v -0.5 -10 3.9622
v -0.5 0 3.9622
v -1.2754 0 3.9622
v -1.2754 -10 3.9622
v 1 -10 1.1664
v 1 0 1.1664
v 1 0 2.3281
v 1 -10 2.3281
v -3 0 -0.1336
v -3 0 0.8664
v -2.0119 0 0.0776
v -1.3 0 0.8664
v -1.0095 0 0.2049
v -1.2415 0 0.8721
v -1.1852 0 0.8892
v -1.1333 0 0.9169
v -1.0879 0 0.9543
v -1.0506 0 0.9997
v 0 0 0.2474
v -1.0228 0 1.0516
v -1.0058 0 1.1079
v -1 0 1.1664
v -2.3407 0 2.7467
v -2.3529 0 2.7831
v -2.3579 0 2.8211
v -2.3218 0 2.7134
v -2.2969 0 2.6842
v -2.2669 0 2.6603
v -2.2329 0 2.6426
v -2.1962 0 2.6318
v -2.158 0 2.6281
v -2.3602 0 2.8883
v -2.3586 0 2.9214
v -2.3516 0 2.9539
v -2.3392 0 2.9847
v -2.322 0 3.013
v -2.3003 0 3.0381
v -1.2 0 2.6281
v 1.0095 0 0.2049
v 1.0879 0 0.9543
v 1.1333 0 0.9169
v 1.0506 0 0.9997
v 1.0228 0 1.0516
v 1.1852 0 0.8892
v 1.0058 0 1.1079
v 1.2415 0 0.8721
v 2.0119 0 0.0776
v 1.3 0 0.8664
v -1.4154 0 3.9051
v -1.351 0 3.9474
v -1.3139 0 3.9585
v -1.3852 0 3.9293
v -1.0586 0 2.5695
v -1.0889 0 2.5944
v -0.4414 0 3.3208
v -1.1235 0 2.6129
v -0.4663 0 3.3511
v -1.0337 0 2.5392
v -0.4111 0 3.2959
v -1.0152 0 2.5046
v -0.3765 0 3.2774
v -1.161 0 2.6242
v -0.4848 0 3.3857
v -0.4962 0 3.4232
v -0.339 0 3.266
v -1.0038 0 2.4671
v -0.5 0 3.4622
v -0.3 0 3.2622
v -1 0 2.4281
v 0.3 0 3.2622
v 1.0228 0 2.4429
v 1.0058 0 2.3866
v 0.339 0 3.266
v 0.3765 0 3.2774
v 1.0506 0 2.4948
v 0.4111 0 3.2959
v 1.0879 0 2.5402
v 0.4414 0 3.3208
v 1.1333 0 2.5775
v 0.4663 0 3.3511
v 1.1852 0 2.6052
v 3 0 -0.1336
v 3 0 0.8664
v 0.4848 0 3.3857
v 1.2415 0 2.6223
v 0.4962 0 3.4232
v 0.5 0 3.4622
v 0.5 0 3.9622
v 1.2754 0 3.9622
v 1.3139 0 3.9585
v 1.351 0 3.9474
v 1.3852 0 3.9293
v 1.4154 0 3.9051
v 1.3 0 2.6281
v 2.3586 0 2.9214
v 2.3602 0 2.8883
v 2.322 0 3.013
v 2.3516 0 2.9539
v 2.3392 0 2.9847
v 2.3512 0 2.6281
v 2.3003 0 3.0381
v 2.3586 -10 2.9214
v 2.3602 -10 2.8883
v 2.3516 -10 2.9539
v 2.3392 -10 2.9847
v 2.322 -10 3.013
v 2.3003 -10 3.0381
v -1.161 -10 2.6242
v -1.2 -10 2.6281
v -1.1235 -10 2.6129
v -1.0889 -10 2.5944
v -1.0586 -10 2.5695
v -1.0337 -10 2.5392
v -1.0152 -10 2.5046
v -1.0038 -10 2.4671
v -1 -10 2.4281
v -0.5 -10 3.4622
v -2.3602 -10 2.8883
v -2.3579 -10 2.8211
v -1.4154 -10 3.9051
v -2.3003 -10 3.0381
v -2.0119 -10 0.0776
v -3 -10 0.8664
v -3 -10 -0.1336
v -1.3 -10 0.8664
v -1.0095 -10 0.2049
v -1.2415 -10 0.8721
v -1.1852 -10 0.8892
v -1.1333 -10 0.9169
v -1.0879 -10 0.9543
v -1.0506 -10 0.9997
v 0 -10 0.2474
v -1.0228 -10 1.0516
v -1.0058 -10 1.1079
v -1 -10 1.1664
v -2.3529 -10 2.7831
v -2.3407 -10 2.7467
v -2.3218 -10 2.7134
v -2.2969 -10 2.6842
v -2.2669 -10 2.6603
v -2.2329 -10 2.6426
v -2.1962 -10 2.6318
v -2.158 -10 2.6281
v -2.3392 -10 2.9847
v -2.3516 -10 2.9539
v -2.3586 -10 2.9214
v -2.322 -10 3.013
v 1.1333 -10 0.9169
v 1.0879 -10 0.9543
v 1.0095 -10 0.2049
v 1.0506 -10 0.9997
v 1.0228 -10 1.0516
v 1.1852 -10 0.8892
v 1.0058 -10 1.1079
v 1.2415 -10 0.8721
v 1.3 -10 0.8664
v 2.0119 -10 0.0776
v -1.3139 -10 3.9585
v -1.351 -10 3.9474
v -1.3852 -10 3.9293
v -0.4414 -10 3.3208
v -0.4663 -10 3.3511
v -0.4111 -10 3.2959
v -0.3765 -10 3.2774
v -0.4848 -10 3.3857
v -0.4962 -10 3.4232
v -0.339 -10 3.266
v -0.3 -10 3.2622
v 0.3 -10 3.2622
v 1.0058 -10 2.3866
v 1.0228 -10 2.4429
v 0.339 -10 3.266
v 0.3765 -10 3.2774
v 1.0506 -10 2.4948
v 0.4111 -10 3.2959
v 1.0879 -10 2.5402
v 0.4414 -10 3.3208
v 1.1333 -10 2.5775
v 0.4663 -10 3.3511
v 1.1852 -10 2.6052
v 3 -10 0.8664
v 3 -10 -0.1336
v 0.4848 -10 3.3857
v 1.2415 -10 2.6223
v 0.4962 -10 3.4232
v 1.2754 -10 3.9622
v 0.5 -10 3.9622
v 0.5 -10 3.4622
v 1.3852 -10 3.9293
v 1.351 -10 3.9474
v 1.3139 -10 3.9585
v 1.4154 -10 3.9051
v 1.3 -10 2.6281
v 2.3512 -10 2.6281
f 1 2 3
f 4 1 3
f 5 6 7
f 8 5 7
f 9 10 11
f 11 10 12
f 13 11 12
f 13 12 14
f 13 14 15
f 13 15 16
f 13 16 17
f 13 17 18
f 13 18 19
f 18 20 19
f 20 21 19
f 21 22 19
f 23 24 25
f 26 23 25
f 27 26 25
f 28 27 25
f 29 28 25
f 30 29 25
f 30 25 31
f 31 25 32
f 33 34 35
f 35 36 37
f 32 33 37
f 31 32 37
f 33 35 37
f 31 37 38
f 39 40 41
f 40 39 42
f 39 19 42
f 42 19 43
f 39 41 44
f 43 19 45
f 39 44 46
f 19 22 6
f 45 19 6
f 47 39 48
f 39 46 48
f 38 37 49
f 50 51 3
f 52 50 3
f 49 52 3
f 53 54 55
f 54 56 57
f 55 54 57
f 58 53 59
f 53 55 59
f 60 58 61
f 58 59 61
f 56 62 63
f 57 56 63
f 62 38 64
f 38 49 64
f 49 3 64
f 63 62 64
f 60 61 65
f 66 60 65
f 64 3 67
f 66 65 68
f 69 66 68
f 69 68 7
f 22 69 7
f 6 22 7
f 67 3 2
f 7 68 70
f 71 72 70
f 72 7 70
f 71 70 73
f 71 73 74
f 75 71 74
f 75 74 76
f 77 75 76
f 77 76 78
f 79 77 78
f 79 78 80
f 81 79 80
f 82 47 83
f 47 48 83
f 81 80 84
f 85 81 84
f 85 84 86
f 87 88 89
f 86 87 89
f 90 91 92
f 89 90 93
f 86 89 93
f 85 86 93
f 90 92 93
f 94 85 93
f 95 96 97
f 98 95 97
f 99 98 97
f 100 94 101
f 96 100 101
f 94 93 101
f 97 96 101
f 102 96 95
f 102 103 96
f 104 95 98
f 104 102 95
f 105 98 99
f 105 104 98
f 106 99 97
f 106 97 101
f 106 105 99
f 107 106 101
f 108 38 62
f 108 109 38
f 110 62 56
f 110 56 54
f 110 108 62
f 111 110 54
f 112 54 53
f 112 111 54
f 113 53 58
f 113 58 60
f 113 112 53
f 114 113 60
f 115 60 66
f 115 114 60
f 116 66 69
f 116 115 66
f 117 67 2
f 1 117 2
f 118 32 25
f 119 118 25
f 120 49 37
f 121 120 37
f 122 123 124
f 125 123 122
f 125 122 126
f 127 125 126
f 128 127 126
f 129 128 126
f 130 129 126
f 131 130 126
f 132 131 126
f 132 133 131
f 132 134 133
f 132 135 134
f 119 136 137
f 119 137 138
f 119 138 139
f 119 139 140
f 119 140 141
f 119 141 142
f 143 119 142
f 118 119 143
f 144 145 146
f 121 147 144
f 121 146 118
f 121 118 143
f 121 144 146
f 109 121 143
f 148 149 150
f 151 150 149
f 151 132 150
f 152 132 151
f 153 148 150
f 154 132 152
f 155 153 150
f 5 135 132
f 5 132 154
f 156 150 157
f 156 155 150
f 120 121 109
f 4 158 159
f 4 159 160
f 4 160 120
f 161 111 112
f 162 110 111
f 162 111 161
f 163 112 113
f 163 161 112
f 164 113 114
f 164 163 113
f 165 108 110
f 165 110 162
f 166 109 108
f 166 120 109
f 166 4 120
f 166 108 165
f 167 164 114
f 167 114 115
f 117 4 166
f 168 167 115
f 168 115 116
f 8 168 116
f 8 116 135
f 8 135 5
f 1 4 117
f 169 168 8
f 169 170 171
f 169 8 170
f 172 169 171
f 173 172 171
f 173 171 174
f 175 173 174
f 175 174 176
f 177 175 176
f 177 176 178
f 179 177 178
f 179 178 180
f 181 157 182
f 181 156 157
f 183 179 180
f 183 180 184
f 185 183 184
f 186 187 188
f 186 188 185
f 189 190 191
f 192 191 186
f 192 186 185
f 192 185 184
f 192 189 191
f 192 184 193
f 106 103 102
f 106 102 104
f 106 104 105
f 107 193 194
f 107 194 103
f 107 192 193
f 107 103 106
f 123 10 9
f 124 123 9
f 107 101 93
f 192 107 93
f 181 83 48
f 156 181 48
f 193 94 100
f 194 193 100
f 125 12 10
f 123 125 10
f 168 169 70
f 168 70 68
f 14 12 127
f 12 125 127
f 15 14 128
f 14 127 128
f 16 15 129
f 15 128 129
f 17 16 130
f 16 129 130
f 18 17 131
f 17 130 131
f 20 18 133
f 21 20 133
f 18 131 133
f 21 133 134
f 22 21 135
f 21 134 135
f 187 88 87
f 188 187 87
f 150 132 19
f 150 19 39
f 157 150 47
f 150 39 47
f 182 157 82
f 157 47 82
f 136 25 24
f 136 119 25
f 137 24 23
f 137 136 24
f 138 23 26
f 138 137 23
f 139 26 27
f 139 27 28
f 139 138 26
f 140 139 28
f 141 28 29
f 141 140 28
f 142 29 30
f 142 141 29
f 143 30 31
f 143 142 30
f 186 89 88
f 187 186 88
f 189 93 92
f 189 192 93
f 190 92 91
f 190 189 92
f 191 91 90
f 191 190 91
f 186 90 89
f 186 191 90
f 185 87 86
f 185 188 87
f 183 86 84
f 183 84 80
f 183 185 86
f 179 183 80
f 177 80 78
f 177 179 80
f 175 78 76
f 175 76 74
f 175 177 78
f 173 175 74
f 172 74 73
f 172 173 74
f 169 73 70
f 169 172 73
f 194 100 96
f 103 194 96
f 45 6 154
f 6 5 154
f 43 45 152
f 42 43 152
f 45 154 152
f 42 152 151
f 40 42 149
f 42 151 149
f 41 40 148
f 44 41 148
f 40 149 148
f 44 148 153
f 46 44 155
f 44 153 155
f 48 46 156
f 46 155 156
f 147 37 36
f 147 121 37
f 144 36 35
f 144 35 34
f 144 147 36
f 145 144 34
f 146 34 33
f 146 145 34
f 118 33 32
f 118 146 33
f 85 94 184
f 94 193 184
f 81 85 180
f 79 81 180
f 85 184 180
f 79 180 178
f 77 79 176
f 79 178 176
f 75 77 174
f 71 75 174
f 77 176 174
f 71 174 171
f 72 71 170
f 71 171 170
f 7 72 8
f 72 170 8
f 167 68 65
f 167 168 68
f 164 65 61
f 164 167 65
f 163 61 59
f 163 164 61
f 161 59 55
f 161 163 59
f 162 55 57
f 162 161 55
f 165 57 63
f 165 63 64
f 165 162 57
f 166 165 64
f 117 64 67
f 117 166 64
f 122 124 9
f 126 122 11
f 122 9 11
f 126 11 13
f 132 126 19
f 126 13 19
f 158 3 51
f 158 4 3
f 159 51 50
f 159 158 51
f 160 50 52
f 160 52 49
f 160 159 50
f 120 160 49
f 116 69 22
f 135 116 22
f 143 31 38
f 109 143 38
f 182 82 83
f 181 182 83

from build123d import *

# Parameters (mm, degrees)
F1_DEPTH = 10
F2_R     = 0.2
F3_R     = 0.3


# Not quite as in the source:
# - a feature names something its author has since deleted; it is built from what else it names


with BuildPart() as f1:
    # F0 (on Front) → F1 (new body)
    with BuildSketch(Plane.XZ):
        with BuildLine():
            Line((-3, 0.8663841993), (-3, -0.1336158007))
            ThreePointArc((-3, -0.1336158007), (-1.5120515098, 0.1517905158), (0, 0.2474341606))
            ThreePointArc((0, 0.2474341606), (1.5120515098, 0.1517905158), (3, -0.1336158007))
            Line((3, -0.1336158007), (3, 0.8663841993))
            Line((3, 0.8663841993), (1, 0.8663841993))
            Line((1, 0.8663841993), (1, 2.6280805469))
            Line((1, 2.6280805469), (2.3511576001, 2.6280805469))
            Line((2.3511576001, 2.6280805469), (2.363298554, 2.9764297366))
            Line((2.363298554, 2.9764297366), (1.357049332, 3.9621986704))
            Line((1.357049332, 3.9621986704), (0.5, 3.9621986704))
            Line((0.5, 3.9621986704), (0.5, 3.2621986704))
            Line((0.5, 3.2621986704), (0, 3.2621986704))
            Line((0, 3.2621986704), (-0.5, 3.2621986704))
            Line((-0.5, 3.2621986704), (-0.5, 3.9621986704))
            Line((-0.5, 3.9621986704), (-1.357049332, 3.9621986704))
            Line((-1.357049332, 3.9621986704), (-2.363298554, 2.9764297366))
            Line((-2.363298554, 2.9764297366), (-2.3511576001, 2.6280805469))
            Line((-2.3511576001, 2.6280805469), (-1, 2.6280805469))
            Line((-1, 2.6280805469), (-1, 0.8663841993))
            Line((-1, 0.8663841993), (-3, 0.8663841993))
        make_face()
    extrude(amount=F1_DEPTH)

    # F2
    f2_edges = [f1.edges().sort_by_distance(p)[0] for p in [
        (-0.5, -5, 3.262199),
        (0.5, -5, 3.262199),
        (2.363299, -5, 2.97643),
        (1.357049, -5, 3.962199),
        (-1, -5, 2.628081),
        (-2.351158, -5, 2.628081),
        (-2.363299, -5, 2.97643),
        (-1.357049, -5, 3.962199),
    ]]
    fillet(f2_edges, radius=F2_R)

    # F3
    f3_edges = [f1.edges().sort_by_distance(p)[0] for p in [
        (-1, -5, 0.866384),
        (1, -5, 0.866384),
        (1, -5, 2.628081),
    ]]
    fillet(f3_edges, radius=F3_R)


solid = f1.part
